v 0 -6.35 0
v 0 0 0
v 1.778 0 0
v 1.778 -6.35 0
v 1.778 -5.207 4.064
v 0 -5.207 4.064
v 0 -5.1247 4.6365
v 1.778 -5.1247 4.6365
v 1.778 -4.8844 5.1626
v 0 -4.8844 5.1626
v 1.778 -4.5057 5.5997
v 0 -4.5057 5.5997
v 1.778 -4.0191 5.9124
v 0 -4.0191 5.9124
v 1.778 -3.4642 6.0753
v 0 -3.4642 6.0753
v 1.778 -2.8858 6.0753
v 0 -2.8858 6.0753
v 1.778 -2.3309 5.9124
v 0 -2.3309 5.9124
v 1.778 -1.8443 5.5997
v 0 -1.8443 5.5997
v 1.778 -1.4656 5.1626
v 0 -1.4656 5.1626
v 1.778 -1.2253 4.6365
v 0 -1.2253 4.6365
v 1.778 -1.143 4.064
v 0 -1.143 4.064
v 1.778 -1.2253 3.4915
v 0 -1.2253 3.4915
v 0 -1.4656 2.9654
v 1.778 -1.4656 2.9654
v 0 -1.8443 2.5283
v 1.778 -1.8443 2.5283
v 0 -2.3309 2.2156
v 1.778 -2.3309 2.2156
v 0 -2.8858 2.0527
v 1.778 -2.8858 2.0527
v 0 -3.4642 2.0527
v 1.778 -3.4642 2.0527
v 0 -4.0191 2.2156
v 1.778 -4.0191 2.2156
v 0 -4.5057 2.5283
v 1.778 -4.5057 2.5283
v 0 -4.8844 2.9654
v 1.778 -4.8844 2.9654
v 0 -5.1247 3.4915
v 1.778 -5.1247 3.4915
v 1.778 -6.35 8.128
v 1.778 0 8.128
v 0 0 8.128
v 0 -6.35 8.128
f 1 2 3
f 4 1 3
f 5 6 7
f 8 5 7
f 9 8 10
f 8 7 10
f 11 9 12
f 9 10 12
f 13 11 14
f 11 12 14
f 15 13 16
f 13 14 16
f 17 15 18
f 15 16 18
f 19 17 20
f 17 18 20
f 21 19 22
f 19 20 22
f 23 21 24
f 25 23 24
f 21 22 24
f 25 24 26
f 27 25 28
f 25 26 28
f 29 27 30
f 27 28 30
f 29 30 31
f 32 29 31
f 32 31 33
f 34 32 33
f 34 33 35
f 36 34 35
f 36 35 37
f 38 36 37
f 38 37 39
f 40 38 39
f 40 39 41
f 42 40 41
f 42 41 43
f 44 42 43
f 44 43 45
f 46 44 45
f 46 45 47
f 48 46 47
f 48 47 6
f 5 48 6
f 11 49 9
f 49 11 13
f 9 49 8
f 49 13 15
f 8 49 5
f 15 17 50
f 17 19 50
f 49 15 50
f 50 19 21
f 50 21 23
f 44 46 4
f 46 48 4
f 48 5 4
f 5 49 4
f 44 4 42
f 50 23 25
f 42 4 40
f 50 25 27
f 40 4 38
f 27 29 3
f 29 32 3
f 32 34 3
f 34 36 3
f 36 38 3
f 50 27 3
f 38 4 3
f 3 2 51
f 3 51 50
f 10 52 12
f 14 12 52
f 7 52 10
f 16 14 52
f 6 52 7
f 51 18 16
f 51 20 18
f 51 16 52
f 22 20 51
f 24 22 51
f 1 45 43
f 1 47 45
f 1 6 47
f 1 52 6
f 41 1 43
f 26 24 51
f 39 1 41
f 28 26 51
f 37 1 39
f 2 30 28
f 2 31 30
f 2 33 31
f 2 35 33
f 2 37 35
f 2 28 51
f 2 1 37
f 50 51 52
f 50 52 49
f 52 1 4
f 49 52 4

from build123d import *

# Parameters (mm, degrees)
SKETCH1_W           = 1.778
SKETCH1_H           = 6.35
BOSS_EXTRUDE1_DEPTH = 8.128
SKETCH2_R           = 2.032
CUT_EXTRUDE1_DEPTH  = 11.466526071


with BuildPart() as part:
    # Sketch1 → Boss-Extrude1 (new body)
    with BuildSketch(Plane.XY):
        with Locations((0.889, -3.175)):
            Rectangle(SKETCH1_W, SKETCH1_H)
    extrude(amount=BOSS_EXTRUDE1_DEPTH)

    # Sketch2 → Cut-Extrude1 (cut, through all)
    with BuildSketch(Plane.ZY):
        with Locations(Location((4.064, -3.175, 0), (0, 0, 270))):
            Circle(SKETCH2_R)
    extrude(amount=-CUT_EXTRUDE1_DEPTH, mode=Mode.SUBTRACT)


solid = part.part
